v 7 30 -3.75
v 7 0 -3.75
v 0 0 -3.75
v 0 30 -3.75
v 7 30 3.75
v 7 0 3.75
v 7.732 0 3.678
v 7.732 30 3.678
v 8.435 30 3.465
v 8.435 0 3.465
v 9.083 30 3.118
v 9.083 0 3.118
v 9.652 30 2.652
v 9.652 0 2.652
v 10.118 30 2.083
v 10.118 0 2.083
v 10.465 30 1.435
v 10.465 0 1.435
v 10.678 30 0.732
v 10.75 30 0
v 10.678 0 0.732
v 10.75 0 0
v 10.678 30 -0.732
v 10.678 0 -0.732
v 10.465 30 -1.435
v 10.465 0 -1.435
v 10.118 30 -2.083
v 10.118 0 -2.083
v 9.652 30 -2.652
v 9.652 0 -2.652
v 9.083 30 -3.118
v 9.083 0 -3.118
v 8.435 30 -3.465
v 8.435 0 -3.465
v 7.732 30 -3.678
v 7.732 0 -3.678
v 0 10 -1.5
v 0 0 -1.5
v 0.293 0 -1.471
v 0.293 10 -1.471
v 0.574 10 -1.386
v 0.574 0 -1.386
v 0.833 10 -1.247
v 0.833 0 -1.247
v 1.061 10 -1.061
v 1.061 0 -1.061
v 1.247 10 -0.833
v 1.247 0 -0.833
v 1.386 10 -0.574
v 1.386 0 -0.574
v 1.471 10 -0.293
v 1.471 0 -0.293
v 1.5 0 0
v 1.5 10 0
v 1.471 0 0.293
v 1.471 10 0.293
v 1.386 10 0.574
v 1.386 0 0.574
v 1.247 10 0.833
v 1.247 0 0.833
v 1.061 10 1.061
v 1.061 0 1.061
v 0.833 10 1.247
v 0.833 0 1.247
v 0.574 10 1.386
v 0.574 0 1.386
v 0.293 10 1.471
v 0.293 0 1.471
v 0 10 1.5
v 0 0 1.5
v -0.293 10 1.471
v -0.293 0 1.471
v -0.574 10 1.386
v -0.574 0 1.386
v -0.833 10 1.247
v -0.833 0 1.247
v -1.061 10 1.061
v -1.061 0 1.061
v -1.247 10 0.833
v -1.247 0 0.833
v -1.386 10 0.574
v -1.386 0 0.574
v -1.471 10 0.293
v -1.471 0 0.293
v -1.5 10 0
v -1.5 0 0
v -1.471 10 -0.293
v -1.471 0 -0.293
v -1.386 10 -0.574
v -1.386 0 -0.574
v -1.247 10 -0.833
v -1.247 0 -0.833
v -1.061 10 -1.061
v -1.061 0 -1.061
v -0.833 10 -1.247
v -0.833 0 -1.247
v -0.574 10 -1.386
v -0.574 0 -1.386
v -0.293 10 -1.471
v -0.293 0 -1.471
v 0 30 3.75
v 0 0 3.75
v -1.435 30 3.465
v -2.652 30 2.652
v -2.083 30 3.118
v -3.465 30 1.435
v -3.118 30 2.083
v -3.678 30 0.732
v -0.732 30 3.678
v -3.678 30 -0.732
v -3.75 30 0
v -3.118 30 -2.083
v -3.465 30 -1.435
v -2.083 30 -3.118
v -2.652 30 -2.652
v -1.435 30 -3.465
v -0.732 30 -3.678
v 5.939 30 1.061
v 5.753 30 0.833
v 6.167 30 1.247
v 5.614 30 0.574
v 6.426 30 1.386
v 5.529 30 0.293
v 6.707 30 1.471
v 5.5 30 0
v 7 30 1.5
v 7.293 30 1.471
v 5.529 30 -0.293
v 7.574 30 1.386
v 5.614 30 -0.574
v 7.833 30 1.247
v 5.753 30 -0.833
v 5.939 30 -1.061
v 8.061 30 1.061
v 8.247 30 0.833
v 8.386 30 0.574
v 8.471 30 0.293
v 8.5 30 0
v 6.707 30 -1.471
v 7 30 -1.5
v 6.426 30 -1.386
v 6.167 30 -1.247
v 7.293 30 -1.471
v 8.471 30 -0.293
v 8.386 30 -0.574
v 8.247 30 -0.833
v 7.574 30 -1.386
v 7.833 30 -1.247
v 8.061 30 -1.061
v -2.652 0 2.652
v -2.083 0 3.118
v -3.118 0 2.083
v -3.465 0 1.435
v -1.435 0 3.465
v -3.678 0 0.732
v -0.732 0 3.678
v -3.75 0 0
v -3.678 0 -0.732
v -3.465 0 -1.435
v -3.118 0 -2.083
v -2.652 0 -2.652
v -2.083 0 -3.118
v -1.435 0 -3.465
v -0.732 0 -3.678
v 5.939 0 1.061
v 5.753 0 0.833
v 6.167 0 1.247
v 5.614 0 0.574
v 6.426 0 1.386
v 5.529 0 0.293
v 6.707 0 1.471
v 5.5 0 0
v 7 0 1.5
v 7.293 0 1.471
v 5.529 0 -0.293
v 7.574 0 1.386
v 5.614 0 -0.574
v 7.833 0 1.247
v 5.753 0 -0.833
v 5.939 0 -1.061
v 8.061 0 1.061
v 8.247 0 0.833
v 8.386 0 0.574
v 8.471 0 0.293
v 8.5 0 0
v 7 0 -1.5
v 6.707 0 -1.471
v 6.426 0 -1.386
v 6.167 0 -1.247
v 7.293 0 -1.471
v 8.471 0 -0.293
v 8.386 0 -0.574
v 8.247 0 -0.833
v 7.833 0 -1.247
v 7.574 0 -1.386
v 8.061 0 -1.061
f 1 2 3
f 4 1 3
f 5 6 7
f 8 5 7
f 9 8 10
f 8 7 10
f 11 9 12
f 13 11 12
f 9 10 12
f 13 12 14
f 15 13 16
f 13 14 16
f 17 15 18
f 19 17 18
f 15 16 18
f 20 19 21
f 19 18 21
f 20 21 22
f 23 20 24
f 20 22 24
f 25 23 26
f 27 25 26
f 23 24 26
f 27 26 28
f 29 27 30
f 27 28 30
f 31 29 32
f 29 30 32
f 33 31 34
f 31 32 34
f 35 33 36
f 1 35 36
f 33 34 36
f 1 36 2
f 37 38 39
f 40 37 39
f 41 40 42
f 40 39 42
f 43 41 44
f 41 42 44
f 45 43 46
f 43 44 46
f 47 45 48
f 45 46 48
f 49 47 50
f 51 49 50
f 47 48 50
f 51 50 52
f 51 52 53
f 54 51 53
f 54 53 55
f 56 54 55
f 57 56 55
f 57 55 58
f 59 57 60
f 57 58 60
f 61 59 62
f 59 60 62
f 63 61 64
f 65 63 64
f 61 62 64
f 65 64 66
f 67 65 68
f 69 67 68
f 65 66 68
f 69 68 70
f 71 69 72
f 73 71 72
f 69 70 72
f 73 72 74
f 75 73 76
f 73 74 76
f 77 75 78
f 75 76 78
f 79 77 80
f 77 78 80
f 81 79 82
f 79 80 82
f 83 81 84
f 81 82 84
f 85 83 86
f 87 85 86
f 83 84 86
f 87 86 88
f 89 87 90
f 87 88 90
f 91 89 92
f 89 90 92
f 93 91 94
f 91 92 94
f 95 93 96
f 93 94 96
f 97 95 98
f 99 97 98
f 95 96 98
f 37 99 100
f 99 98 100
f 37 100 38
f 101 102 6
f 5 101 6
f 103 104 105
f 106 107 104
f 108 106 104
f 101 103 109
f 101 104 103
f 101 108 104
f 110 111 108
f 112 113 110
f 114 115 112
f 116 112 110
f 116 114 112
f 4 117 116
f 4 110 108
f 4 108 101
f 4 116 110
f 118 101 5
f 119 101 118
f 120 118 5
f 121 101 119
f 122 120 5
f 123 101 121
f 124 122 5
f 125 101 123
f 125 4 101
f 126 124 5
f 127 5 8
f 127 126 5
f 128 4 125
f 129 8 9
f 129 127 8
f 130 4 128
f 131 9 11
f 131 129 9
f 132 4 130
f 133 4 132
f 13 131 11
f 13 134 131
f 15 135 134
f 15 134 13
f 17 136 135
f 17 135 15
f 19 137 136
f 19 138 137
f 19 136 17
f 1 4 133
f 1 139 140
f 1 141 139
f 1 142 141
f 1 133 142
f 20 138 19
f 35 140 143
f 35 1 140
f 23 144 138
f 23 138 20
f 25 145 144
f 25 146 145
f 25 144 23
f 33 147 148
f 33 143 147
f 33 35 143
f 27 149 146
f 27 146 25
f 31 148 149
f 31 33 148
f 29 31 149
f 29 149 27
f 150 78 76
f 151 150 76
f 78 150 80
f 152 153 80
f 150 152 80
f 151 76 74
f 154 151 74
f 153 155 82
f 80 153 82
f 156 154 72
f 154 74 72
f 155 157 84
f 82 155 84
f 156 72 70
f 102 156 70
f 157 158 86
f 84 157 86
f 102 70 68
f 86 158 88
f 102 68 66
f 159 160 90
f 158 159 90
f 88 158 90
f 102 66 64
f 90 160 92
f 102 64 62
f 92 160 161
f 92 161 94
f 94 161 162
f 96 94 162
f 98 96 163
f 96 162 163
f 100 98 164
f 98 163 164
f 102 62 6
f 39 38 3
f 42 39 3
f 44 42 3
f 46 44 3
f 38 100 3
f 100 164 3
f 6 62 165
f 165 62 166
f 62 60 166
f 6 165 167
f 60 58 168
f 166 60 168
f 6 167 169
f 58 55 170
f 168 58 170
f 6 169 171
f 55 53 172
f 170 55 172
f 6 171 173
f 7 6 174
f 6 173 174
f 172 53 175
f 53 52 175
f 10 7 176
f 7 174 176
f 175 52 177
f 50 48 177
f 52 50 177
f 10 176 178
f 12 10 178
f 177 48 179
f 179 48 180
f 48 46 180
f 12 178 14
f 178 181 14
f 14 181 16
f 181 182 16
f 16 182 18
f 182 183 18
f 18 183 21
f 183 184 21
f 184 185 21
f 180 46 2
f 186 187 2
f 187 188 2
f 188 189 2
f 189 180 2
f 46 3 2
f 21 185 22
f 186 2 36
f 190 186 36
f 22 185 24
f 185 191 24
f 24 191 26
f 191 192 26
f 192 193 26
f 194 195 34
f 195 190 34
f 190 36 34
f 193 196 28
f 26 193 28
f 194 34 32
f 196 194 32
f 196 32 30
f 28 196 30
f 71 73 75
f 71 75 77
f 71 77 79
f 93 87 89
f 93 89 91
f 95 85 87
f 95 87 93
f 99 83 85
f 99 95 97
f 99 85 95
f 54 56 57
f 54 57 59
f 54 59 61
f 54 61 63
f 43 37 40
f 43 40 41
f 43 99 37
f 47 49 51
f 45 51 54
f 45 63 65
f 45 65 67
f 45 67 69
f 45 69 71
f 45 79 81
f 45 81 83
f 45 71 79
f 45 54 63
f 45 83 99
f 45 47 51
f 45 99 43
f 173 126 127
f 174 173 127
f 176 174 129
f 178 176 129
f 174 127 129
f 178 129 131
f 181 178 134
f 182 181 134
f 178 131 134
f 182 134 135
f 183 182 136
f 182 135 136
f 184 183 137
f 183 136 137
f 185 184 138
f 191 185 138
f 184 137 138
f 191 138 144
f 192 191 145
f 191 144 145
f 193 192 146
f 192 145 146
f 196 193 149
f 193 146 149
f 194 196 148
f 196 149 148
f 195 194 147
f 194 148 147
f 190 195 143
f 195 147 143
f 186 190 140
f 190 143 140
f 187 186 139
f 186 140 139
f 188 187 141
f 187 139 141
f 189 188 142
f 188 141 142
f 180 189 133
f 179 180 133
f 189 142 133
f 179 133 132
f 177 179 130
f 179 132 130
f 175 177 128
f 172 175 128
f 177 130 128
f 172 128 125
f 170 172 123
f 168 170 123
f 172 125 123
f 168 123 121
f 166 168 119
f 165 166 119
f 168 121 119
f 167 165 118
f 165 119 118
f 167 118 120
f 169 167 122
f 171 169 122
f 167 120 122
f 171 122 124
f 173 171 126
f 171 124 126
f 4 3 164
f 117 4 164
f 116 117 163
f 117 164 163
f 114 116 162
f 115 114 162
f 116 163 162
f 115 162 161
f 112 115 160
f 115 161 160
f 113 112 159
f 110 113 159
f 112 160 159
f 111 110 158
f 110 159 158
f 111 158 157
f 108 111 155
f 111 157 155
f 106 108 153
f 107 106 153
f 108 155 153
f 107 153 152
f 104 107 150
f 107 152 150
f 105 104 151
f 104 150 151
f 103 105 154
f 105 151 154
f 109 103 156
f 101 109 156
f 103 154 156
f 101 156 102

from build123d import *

# Parameters (mm, degrees)
BOSS_EXTRUDE2_DEPTH = 30
SKETCH2_R           = 1.5
CUT_EXTRUDE1_DEPTH  = 30
SKETCH3_R           = 1.5
CUT_EXTRUDE2_DEPTH  = 10


with BuildPart() as part:
    # Sketch1 → Boss-Extrude2 (new body)
    with BuildSketch(Plane(origin=(0, 0, 0), x_dir=(1, 0, 0), z_dir=(0, 1, 0))):
        with BuildLine():
            ThreePointArc((0, 3.75), (-3.75, 0), (0, -3.75))
            Line((0, -3.75), (7, -3.75))
            ThreePointArc((7, -3.75), (10.75, 0), (7, 3.75))
            Line((7, 3.75), (0, 3.75))
        make_face()
    extrude(amount=BOSS_EXTRUDE2_DEPTH)

    # Sketch2 → Cut-Extrude1 (cut)
    with BuildSketch(Plane(origin=(0, 30, 0), x_dir=(1, 0, 0), z_dir=(0, 1, 0))):
        with Locations((7, 0)):
            Circle(SKETCH2_R)
    extrude(amount=-CUT_EXTRUDE1_DEPTH, mode=Mode.SUBTRACT)

    # Sketch3 → Cut-Extrude2 (cut)
    with BuildSketch(Plane.XZ):
        Circle(SKETCH3_R)
    extrude(amount=-CUT_EXTRUDE2_DEPTH, mode=Mode.SUBTRACT)


solid = part.part
